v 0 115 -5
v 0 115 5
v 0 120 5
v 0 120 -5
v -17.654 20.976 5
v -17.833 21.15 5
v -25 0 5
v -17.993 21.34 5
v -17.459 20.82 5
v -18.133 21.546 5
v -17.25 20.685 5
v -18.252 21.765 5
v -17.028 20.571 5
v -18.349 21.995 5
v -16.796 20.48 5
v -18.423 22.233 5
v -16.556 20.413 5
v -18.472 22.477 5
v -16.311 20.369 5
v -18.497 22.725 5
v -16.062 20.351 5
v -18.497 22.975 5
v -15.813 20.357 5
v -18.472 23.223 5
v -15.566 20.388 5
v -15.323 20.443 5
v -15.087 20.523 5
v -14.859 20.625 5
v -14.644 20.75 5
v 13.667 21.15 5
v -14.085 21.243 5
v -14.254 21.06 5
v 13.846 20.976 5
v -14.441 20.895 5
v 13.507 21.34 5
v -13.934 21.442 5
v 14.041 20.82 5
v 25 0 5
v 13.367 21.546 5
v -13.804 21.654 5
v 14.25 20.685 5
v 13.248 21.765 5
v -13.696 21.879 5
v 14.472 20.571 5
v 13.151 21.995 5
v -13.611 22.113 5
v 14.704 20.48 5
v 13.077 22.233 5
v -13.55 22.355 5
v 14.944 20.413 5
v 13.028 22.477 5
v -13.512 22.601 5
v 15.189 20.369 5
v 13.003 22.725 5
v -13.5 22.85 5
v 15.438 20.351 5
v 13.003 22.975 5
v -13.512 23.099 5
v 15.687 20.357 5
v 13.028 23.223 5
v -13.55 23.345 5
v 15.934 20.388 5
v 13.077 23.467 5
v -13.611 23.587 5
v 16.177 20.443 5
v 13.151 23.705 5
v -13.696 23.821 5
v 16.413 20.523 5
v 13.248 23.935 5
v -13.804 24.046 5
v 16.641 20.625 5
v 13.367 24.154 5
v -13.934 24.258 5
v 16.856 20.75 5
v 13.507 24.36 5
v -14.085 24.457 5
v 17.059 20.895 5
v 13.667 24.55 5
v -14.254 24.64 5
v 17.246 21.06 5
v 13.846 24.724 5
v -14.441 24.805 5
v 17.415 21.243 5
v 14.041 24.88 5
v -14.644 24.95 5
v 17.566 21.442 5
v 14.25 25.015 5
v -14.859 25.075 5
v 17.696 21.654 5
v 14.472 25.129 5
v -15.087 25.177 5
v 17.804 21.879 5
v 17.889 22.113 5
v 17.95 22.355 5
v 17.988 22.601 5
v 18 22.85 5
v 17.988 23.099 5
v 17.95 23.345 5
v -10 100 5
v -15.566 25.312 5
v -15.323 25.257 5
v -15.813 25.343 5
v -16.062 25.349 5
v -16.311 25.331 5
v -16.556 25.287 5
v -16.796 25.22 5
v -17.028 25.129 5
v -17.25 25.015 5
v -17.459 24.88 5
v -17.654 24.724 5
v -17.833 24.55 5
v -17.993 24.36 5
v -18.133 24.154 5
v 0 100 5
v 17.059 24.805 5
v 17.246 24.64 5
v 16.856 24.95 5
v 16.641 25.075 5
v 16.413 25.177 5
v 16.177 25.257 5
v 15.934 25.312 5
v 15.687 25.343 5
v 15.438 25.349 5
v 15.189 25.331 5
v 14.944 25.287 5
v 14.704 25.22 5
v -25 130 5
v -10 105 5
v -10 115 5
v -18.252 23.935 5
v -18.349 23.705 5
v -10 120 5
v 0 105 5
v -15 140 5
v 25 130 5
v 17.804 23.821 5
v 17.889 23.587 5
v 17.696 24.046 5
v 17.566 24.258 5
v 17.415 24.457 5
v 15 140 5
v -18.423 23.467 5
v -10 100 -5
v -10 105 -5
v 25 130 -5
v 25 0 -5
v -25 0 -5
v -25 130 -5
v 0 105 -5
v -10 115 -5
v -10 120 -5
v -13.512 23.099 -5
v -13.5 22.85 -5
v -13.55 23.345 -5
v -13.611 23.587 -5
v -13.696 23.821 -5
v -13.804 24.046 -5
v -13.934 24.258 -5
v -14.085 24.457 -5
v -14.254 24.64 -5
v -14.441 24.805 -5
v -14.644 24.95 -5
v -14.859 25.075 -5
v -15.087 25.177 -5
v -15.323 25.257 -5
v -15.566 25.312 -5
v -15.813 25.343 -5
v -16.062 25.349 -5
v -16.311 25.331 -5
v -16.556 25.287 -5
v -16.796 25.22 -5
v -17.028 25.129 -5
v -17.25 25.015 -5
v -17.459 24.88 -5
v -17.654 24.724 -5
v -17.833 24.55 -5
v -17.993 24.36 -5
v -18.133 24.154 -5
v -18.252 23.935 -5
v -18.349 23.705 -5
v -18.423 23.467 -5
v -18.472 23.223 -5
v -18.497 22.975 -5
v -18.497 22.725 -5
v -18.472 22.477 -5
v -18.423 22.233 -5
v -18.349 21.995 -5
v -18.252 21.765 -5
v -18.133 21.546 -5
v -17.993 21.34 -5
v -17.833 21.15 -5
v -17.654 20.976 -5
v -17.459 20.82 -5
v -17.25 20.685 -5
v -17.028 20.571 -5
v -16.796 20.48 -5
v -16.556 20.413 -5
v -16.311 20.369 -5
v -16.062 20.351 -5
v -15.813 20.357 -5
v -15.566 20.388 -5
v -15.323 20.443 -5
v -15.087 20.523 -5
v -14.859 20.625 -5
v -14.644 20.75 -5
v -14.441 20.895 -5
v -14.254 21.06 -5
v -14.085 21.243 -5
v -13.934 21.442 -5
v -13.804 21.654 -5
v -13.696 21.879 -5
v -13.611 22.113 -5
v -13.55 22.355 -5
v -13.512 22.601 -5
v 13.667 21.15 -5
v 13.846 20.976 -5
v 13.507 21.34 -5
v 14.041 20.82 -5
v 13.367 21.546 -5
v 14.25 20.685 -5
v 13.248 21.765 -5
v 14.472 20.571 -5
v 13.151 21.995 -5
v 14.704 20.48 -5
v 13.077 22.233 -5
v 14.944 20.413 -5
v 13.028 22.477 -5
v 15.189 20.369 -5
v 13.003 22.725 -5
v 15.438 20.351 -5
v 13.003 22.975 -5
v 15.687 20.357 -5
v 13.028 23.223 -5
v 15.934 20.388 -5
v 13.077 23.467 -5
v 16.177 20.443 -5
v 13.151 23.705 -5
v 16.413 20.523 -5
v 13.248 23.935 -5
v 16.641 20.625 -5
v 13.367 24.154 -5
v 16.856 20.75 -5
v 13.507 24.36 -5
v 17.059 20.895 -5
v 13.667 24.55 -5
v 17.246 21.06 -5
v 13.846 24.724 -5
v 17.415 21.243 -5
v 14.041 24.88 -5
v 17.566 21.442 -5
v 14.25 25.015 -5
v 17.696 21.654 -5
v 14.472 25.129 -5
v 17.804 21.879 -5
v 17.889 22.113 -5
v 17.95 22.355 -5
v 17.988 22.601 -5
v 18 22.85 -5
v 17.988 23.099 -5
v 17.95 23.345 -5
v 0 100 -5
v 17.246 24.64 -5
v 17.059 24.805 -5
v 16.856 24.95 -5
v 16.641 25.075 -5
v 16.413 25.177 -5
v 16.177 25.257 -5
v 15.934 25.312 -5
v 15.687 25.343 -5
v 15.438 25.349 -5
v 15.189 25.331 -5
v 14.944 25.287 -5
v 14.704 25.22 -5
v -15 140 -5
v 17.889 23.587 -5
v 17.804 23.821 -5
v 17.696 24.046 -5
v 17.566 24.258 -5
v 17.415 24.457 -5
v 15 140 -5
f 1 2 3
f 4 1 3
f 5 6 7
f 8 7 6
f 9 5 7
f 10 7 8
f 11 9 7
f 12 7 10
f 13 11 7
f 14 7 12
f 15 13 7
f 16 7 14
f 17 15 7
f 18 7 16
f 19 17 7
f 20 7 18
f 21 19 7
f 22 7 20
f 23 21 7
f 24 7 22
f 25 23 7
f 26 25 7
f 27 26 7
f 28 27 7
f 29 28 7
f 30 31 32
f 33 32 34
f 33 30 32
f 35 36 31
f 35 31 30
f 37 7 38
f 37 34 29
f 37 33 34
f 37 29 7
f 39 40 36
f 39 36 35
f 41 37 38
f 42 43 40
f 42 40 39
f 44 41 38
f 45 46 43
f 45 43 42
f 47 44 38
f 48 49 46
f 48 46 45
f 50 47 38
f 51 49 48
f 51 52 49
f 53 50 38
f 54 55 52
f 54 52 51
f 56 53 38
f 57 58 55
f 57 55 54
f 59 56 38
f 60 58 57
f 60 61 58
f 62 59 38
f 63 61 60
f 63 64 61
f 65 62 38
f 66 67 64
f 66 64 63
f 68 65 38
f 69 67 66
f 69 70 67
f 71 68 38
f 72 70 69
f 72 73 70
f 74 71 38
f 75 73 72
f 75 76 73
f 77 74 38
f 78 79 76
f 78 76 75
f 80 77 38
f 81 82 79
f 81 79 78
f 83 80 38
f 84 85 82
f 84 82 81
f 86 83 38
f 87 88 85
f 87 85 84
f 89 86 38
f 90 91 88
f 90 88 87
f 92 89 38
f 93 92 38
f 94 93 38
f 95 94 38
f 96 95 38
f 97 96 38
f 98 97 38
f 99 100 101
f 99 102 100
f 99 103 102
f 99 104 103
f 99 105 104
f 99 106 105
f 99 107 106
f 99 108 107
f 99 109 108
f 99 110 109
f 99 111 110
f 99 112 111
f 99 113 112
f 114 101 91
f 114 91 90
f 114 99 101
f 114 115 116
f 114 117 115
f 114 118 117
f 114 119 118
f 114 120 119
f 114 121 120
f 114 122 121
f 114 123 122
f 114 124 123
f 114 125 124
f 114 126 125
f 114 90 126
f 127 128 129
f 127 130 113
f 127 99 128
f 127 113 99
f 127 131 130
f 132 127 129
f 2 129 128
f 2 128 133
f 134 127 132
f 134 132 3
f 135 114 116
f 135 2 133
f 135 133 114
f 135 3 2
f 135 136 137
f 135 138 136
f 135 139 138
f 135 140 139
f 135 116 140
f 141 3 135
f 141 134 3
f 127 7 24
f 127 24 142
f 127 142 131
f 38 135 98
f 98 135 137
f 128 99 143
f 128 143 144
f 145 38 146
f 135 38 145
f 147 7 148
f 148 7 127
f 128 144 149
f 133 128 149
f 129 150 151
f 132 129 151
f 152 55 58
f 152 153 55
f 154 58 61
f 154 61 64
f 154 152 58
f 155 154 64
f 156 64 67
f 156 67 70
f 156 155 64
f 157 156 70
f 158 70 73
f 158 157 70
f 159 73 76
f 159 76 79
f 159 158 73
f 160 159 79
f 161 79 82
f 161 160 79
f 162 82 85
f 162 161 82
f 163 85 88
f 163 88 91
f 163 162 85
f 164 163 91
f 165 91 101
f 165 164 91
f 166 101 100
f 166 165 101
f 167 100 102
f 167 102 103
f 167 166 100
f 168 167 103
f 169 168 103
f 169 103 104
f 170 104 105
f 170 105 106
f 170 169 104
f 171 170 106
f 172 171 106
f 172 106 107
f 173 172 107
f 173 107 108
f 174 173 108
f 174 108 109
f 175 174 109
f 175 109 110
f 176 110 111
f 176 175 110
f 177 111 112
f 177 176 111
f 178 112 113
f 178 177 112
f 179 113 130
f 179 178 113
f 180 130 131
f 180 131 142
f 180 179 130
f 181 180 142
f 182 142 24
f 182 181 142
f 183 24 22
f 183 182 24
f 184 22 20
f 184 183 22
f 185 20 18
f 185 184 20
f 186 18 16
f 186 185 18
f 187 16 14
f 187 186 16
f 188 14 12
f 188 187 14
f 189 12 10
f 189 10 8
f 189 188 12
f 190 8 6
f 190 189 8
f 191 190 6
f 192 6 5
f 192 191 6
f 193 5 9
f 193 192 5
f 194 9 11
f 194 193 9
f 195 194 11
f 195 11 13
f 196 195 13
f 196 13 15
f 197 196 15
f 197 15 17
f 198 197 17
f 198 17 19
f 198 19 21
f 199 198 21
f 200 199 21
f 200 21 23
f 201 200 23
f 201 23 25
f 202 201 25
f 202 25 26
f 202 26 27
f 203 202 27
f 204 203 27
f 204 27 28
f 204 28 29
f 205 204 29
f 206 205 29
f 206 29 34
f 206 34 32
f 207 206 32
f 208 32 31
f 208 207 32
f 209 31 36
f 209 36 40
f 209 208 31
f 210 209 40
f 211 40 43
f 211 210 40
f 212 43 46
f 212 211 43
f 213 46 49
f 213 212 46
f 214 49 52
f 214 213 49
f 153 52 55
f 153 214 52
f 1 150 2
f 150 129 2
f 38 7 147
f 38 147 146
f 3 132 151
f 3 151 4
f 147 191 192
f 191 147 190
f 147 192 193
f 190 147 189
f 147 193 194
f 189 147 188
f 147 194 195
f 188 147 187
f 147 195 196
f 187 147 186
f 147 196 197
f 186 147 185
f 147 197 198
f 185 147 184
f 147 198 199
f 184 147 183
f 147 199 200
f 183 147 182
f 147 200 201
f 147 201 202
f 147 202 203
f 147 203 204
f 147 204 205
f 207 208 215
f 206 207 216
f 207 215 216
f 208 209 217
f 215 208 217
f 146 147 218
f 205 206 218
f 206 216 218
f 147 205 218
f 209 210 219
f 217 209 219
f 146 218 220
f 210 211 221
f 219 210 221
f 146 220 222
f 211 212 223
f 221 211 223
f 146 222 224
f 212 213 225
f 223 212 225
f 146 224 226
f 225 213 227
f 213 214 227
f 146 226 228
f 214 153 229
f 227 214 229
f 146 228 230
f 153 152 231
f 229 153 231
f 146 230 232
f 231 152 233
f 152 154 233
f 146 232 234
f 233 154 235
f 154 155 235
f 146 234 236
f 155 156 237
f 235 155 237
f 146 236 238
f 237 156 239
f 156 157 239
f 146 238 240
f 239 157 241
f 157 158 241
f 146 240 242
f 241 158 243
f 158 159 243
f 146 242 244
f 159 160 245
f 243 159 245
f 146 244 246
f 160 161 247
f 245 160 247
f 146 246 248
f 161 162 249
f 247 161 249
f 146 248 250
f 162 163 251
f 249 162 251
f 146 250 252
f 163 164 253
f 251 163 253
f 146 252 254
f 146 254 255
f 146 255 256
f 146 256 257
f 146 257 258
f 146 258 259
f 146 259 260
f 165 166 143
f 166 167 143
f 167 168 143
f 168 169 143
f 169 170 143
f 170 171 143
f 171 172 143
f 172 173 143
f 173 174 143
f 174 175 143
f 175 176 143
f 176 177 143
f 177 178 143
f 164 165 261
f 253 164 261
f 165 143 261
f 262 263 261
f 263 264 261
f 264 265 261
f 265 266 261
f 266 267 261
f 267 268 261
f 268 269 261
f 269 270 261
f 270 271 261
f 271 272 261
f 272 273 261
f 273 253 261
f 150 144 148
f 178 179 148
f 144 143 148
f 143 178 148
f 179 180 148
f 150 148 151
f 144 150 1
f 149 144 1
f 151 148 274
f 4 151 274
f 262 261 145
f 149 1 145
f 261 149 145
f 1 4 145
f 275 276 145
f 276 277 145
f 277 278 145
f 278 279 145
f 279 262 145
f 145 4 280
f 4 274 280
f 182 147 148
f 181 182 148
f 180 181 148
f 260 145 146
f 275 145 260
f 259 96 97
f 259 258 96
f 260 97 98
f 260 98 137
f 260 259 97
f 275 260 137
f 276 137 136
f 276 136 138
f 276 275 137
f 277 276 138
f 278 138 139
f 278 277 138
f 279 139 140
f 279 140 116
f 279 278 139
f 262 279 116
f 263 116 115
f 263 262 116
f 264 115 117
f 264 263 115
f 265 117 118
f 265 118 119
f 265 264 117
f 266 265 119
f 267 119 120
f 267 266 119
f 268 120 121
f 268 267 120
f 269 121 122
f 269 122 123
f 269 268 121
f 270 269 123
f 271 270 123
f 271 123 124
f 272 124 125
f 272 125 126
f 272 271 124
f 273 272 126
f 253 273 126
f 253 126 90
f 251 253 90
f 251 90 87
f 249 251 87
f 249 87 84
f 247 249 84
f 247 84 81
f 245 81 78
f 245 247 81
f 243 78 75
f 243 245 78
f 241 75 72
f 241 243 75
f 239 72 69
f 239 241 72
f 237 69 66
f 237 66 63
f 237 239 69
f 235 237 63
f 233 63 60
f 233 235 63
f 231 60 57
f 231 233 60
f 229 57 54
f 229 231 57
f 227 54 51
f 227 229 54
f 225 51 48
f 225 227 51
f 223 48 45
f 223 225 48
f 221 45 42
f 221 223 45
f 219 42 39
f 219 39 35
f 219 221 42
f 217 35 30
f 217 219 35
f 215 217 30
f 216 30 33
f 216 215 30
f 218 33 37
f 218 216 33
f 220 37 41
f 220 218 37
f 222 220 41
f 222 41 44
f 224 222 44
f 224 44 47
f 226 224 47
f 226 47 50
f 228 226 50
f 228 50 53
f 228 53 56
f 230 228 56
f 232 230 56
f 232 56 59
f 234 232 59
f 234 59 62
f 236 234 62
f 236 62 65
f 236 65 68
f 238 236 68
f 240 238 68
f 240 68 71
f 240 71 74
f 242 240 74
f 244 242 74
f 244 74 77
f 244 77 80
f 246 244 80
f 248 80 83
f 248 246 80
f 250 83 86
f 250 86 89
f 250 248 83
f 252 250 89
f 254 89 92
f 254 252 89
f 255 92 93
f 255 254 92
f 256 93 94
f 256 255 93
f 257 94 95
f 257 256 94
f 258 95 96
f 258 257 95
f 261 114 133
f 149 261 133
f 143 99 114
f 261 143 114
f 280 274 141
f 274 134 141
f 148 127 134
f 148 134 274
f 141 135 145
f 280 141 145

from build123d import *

# Parameters (mm, degrees)
SKETCH1_W           = 50
SKETCH1_H           = 140
SKETCH1_R           = 2.5
SKETCH1_W_2         = 10
SKETCH1_H_2         = 5
BOSS_EXTRUDE1_DEPTH = 5
CHAMFER1_SIZE       = 10


with BuildPart() as part:
    # Sketch1 → Boss-Extrude1 (new, symmetric)
    with BuildSketch(Plane.XY):
        with Locations((0, 70)):
            Rectangle(SKETCH1_W, SKETCH1_H)
        with Locations((-16, 22.85)):
            Circle(SKETCH1_R, mode=Mode.SUBTRACT)
        with Locations((15.5, 22.85)):
            Circle(SKETCH1_R, mode=Mode.SUBTRACT)
        with Locations((-5, 102.5)):
            Rectangle(SKETCH1_W_2, SKETCH1_H_2, mode=Mode.SUBTRACT)
        with Locations((-5, 117.5)):
            Rectangle(SKETCH1_W_2, SKETCH1_H_2, mode=Mode.SUBTRACT)
    extrude(amount=BOSS_EXTRUDE1_DEPTH, both=True)

    # Chamfer1
    chamfer1_edges = [part.edges().sort_by_distance(p)[0] for p in [
        (25, 140, 0),
        (-25, 140, 0),
    ]]
    chamfer(chamfer1_edges, length=CHAMFER1_SIZE)


solid = part.part
